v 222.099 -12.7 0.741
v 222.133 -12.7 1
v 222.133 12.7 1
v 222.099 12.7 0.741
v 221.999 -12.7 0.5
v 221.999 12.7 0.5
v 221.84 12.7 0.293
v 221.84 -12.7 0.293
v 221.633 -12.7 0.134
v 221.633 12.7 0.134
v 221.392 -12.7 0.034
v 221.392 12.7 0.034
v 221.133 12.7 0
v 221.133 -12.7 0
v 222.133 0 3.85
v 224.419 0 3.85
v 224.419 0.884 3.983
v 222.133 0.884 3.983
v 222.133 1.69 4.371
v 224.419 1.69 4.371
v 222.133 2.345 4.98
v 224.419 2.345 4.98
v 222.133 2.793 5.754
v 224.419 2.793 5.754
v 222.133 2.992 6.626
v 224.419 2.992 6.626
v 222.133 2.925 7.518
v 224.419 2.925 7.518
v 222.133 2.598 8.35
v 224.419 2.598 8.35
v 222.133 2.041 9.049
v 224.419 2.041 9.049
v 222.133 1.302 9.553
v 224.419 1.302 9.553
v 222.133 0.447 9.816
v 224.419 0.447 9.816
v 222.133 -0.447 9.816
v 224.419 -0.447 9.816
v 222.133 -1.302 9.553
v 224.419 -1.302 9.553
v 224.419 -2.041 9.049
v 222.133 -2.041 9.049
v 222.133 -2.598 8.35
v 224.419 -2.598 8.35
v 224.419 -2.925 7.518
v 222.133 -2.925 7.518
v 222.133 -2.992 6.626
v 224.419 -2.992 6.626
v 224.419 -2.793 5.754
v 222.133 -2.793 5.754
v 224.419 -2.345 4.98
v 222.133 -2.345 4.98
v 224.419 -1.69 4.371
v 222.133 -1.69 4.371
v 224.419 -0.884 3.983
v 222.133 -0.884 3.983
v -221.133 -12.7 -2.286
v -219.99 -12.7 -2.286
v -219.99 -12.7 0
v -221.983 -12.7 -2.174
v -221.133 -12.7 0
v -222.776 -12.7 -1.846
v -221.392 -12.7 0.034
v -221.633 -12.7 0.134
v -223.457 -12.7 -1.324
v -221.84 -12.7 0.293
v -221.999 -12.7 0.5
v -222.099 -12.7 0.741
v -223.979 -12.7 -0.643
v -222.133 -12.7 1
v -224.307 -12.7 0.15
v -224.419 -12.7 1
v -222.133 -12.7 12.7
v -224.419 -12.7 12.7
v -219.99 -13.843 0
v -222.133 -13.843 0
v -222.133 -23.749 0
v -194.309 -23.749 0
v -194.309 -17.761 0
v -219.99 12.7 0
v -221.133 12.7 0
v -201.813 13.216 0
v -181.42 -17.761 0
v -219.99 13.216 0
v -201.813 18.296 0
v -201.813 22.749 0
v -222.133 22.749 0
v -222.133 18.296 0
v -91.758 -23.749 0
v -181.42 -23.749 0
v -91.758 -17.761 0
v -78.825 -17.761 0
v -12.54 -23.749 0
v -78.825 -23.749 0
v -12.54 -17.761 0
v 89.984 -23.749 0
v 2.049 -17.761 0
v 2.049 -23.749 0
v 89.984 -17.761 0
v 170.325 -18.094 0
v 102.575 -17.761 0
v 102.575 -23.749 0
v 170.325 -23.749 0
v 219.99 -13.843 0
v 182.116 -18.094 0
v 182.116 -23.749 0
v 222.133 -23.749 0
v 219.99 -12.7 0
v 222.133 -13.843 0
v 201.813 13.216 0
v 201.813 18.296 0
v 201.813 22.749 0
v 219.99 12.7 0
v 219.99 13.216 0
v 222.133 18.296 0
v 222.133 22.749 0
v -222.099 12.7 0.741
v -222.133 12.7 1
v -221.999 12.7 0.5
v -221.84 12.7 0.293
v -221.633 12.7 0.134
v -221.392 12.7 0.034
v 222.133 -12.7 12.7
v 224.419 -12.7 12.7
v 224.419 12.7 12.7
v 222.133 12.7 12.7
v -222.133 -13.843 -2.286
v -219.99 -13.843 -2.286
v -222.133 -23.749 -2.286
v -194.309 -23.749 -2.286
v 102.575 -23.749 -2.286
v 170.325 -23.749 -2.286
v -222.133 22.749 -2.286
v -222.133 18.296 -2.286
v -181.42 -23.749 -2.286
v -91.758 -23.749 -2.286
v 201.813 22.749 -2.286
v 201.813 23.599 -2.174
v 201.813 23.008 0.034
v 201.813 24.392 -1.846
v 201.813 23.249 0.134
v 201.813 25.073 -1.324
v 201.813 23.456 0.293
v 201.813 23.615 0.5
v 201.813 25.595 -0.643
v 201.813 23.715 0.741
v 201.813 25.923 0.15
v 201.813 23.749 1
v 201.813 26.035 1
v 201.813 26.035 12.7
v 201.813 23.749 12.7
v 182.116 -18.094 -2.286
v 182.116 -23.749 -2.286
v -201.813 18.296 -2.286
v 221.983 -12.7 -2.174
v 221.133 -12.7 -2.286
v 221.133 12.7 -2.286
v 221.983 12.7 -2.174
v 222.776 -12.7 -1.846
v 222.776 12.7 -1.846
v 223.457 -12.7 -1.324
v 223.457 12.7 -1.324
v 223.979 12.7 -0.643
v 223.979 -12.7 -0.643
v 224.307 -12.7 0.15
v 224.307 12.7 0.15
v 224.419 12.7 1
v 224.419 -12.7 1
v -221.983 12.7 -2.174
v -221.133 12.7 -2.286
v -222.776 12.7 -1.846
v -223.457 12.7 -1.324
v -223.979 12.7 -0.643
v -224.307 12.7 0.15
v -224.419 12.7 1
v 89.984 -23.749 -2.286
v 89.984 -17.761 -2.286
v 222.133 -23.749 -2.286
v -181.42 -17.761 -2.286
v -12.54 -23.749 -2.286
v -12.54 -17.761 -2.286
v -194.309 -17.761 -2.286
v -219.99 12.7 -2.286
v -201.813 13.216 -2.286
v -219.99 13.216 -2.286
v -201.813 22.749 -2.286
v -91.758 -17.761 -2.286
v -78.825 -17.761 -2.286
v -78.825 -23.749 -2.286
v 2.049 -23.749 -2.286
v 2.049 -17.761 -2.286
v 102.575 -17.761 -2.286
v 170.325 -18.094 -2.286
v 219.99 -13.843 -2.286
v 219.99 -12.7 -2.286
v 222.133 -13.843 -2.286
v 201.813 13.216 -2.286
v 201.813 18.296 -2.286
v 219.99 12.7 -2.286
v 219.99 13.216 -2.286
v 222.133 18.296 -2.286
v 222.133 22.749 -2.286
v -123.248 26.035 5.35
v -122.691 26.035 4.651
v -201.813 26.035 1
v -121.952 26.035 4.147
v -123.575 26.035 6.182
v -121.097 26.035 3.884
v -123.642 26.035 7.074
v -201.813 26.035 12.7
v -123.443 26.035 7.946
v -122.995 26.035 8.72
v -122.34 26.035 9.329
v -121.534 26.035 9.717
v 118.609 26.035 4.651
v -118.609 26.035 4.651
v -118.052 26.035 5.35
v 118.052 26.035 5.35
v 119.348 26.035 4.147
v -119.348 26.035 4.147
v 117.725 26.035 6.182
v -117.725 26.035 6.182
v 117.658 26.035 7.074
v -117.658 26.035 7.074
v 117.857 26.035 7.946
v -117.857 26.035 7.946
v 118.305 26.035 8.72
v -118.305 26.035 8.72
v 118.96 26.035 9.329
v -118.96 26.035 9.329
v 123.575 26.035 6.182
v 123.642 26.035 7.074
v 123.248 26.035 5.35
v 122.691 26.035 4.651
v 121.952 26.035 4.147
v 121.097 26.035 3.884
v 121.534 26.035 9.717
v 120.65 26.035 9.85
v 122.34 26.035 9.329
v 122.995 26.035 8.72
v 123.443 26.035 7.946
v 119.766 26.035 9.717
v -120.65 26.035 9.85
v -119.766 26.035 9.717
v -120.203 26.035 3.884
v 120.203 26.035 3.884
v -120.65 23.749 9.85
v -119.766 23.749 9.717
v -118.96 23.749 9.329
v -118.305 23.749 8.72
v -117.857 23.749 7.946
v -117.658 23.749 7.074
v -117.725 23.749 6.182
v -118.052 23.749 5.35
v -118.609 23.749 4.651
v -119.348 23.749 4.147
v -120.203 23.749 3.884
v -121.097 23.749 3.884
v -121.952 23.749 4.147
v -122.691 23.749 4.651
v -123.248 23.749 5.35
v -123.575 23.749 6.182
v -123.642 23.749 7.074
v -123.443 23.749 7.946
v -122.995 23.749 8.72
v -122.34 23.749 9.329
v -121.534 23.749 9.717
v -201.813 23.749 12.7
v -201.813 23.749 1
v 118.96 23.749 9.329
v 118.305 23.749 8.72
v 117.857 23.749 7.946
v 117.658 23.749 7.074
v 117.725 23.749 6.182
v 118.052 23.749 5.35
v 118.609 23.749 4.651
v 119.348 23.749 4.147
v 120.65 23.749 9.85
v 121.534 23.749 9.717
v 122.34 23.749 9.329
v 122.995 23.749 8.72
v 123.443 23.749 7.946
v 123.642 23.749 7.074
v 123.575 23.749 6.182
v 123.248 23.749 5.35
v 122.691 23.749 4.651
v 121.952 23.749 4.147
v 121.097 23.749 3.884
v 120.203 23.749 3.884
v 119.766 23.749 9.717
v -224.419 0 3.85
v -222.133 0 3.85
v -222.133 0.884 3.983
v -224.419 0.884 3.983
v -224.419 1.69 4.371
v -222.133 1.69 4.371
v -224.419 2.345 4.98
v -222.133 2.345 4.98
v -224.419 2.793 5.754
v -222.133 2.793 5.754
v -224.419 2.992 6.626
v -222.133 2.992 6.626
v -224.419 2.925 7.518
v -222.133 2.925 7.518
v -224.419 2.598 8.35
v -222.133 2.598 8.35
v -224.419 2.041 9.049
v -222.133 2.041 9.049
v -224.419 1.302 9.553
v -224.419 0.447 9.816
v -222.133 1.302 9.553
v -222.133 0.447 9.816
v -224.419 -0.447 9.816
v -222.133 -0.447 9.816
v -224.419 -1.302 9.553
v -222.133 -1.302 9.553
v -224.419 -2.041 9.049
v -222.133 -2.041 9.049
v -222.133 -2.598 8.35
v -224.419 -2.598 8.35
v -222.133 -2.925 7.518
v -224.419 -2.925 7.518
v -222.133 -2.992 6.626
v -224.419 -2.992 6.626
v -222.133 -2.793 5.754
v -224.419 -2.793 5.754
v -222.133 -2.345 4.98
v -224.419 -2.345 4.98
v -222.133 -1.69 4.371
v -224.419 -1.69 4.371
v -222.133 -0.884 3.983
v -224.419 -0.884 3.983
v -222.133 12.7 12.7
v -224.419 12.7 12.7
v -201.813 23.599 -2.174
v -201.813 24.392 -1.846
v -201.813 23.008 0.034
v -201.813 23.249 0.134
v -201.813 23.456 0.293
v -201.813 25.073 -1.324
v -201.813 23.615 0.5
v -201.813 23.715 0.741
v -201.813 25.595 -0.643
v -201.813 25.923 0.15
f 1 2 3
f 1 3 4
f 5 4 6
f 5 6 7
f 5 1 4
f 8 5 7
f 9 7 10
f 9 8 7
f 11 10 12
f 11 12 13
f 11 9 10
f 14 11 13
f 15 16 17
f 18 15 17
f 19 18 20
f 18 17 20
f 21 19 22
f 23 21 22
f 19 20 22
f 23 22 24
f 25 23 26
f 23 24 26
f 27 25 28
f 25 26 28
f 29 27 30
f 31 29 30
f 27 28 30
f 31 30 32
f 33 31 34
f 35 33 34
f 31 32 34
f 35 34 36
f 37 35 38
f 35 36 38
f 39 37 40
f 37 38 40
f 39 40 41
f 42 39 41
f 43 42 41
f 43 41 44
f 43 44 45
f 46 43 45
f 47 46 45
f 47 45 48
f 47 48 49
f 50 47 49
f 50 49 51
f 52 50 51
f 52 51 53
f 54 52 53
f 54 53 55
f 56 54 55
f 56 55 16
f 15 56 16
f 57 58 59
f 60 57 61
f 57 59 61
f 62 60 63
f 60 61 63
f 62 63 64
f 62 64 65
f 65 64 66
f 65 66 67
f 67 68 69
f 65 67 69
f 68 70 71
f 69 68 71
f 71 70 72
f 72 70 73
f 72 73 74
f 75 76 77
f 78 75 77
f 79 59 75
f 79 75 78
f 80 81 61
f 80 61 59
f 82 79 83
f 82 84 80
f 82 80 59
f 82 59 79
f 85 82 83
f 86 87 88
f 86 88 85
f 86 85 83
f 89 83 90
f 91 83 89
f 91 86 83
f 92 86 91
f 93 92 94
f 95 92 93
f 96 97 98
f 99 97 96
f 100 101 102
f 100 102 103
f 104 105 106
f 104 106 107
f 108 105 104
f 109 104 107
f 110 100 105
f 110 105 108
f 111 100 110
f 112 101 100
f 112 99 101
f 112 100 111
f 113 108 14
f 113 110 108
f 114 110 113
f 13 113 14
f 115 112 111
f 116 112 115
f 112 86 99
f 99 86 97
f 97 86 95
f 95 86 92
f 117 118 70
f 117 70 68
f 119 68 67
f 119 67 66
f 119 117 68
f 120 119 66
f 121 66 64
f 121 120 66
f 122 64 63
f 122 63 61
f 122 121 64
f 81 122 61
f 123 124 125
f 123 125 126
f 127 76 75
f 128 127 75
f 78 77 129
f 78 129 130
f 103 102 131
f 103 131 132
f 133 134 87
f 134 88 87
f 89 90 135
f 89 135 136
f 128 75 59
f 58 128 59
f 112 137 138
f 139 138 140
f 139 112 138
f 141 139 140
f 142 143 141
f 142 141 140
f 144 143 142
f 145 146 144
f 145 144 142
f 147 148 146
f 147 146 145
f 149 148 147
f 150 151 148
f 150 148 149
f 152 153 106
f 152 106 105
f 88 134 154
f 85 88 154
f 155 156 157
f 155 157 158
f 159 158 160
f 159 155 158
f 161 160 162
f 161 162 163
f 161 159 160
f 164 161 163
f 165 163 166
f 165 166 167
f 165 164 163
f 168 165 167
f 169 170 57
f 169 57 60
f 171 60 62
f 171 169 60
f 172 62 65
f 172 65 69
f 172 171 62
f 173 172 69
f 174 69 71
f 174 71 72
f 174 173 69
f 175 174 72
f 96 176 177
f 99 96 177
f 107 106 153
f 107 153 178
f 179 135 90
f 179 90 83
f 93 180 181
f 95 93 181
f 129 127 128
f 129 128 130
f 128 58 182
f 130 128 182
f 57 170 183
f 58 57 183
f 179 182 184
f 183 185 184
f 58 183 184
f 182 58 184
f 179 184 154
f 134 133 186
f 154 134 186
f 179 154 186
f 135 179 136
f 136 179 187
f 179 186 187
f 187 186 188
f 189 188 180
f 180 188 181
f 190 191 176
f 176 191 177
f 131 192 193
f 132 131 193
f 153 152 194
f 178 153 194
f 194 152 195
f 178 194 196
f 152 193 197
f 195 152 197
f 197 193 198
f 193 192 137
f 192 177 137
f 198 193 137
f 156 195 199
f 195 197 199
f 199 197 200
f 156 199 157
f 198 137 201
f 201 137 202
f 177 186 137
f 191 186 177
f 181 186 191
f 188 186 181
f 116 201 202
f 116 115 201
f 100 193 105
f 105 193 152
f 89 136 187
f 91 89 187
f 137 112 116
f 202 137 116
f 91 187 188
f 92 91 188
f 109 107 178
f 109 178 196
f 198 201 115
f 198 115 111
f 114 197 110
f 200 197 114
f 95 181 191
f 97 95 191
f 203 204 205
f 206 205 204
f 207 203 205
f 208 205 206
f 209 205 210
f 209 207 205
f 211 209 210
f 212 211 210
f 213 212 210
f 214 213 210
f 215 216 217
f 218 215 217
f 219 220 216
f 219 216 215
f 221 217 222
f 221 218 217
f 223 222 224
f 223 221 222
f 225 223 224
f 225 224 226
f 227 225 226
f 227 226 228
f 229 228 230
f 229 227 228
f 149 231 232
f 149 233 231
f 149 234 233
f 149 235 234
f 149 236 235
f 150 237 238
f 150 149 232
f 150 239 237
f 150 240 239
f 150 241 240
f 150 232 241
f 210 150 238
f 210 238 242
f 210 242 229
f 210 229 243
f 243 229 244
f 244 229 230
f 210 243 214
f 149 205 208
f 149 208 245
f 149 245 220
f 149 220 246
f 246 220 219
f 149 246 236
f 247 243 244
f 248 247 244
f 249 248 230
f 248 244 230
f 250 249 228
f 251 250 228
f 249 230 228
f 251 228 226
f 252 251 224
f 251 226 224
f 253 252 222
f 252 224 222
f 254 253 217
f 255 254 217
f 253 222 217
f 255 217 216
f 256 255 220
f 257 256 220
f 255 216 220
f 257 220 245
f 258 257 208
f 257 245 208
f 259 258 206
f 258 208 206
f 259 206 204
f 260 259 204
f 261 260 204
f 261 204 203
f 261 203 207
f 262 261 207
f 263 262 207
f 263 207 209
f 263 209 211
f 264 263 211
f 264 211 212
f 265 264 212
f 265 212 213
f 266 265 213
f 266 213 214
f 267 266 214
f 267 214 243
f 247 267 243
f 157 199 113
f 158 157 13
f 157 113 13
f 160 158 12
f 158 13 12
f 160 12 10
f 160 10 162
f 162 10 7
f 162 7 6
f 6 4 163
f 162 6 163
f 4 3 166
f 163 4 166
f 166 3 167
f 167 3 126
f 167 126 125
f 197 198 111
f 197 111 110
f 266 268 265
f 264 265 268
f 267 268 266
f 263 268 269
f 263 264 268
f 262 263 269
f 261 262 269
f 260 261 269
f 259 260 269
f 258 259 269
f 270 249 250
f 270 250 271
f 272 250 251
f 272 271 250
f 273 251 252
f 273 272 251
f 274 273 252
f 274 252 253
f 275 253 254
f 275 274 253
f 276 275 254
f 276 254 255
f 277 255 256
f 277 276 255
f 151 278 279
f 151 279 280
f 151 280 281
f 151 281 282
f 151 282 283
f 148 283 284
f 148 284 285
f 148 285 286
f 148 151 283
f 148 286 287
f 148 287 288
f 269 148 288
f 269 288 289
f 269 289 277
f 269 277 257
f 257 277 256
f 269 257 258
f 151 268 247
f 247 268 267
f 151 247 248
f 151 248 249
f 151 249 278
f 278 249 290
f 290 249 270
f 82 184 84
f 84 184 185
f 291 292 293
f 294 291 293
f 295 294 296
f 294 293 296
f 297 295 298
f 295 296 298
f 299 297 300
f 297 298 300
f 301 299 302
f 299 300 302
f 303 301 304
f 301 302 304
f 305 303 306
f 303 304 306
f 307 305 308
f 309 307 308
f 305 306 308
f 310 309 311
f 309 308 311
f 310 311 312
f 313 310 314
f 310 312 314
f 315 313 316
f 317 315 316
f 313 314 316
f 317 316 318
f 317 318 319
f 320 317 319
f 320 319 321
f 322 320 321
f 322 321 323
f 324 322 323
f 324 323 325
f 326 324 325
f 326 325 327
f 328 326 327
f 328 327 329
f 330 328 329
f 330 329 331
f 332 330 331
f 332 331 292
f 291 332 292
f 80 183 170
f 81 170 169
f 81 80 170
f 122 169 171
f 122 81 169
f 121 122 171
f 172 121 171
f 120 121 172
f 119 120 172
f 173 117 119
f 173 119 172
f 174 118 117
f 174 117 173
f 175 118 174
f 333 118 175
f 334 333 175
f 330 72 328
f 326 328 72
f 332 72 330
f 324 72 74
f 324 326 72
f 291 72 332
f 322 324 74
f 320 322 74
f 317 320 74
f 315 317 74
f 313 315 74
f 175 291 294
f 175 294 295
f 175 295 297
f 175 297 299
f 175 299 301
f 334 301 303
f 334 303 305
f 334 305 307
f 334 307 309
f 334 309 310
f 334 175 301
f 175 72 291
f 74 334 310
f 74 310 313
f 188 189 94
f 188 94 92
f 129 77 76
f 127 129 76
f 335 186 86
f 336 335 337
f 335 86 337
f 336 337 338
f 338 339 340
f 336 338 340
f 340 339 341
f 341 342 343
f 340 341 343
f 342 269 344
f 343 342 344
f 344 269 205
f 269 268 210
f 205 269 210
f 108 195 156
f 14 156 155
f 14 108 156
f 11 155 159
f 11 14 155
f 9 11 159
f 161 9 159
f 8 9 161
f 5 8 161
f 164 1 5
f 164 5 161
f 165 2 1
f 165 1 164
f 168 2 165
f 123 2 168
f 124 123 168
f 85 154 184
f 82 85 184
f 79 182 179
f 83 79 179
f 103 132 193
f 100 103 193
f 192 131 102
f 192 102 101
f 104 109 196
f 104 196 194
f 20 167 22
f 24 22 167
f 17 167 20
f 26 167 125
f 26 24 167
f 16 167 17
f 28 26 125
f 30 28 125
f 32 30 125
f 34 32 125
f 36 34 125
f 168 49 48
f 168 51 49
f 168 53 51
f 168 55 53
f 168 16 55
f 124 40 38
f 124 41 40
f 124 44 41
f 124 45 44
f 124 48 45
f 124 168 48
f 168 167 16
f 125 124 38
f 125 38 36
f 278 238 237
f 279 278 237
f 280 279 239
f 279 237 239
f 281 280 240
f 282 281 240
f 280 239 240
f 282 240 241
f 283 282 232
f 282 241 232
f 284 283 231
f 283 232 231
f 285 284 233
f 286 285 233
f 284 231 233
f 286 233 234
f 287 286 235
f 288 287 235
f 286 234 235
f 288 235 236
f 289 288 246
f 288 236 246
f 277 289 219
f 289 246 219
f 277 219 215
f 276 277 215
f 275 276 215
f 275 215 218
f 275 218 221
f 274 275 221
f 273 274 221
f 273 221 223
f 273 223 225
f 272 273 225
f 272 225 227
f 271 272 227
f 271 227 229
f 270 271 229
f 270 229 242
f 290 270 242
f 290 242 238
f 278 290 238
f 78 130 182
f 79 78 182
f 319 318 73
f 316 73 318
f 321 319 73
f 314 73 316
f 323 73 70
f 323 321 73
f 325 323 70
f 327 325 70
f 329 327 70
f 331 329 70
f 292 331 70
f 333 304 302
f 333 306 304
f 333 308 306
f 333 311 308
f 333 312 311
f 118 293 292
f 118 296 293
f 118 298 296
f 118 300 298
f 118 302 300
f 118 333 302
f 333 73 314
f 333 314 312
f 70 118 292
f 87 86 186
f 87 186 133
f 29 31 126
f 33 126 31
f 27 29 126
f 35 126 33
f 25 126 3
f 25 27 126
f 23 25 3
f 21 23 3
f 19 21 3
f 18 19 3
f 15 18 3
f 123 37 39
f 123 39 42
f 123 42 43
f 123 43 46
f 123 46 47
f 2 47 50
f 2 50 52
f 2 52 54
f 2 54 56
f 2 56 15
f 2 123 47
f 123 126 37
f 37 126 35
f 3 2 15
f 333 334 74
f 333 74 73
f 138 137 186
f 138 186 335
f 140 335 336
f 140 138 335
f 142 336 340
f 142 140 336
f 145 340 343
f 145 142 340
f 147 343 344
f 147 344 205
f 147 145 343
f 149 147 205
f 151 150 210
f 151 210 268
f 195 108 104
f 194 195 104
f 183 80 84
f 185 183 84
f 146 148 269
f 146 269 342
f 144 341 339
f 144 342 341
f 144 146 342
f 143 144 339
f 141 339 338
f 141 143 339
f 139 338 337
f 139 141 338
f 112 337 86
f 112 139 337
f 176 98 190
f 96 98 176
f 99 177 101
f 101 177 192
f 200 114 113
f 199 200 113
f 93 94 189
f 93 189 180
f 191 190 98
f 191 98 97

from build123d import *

# Parameters (mm, degrees)
SKETCH1_W                     = 444.26599996
SKETCH1_H                     = 47.498
BASE_FLANGE1_DEPTH            = 2.286
EDGE_FLANGE1_STRIP_W          = 11.144
EDGE_FLANGE1_STRIP_H          = 2.286
EDGE_FLANGE1_STRIP_CUT_DEPTH  = 25.4
EDGE_FLANGE1_RELIEF_W         = 12.287
EDGE_FLANGE1_RELIEF_H         = 1.143
EDGE_FLANGE1_RELIEF_CUT_DEPTH = 2.286
EDGE_FLANGE1_DEPTH            = 25.4
EDGE_FLANGE2_STRIP_W          = 11.144
EDGE_FLANGE2_STRIP_H          = 2.286
EDGE_FLANGE2_STRIP_CUT_DEPTH  = 25.4
EDGE_FLANGE2_RELIEF_W         = 12.287
EDGE_FLANGE2_RELIEF_H         = 1.143
EDGE_FLANGE2_RELIEF_CUT_DEPTH = 2.286
EDGE_FLANGE2_DEPTH            = 25.4
EDGE_FLANGE6_STRIP_W          = 11.144
EDGE_FLANGE6_STRIP_H          = 2.286
EDGE_FLANGE6_STRIP_CUT_DEPTH  = 444.26599996
EDGE_FLANGE6_DEPTH            = 444.26599996
SKETCH52_R                    = 3
CUT_EXTRUDE2_DEPTH            = 231.225159807
SKETCH53_R                    = 3
CUT_EXTRUDE3_DEPTH            = 450.771788169
SKETCH54_W                    = 20.32
SKETCH54_H                    = 3.286
CUT_EXTRUDE4_DEPTH            = 227.280796306
CUT_EXTRUDE6_DEPTH            = 227.280796306
CUT_EXTRUDE6_DEPTH_BACK       = 227.280796306
SKETCH57_W                    = 12.932384232
SKETCH57_H                    = 5.987852531
SKETCH57_W_2                  = 12.889095721
SKETCH57_H_2                  = 5.98785253
SKETCH57_W_3                  = 14.589217144
SKETCH57_H_3                  = 5.987852532
SKETCH57_W_4                  = 12.590694247
SKETCH57_H_4                  = 5.987852533
SKETCH57_W_5                  = 11.791285089
SKETCH57_H_5                  = 5.654723841


# Sheet-metal steps are written as plain solids
with BuildPart() as part:
    # Sketch1 → Base-Flange1 (new body)
    with BuildSketch(Plane.XY):
        Rectangle(SKETCH1_W, SKETCH1_H)
    extrude(amount=-BASE_FLANGE1_DEPTH)

    # Edge-Flange1 strip (across the edge) → Edge-Flange1 strip cut (cut)
    with BuildSketch(Plane(origin=(222.13299998, -12.7, 0), x_dir=(-1, 0, 0), z_dir=(0, 1, 0))):
        with Locations((-4.572, -1.143)):
            Rectangle(EDGE_FLANGE1_STRIP_W, EDGE_FLANGE1_STRIP_H)
    extrude(amount=EDGE_FLANGE1_STRIP_CUT_DEPTH, mode=Mode.SUBTRACT)

    # Edge-Flange1 relief (on the sheet) → Edge-Flange1 relief cut (cut)
    with BuildSketch(Plane(origin=(221.13299998, -12.7, 0), x_dir=(-1, 0, 0), z_dir=(0, 0, 1))):
        with Locations((-5.0005, 0.5715)):
            Rectangle(EDGE_FLANGE1_RELIEF_W, EDGE_FLANGE1_RELIEF_H)
        with Locations((-5.0005, -25.9715)):
            Rectangle(EDGE_FLANGE1_RELIEF_W, EDGE_FLANGE1_RELIEF_H)
    extrude(amount=-EDGE_FLANGE1_RELIEF_CUT_DEPTH, mode=Mode.SUBTRACT)

    # Edge-Flange1 section (across the edge) → Edge-Flange1 (add)
    with BuildSketch(Plane(origin=(222.13299998, -12.7, 0), x_dir=(-1, 0, 0), z_dir=(0, 1, 0))):
        with BuildLine():
            Line((-2.286, 1), (-2.286, 12.7))
            Line((-2.286, 12.7), (0, 12.7))
            Line((0, 12.7), (0, 1))
            ThreePointArc((0, 1), (0.292893219, 0.292893219), (1, 0))
            Line((1, 0), (1, -2.286))
            ThreePointArc((1, -2.286), (-1.323552883, -1.323552883), (-2.286, 1))
        make_face()
    extrude(amount=EDGE_FLANGE1_DEPTH)

    # Edge-Flange2 strip (across the edge) → Edge-Flange2 strip cut (cut)
    with BuildSketch(Plane(origin=(-222.13299998, 12.7, 0), x_dir=(1, 0, 0), z_dir=(0, -1, 0))):
        with Locations((-4.572, -1.143)):
            Rectangle(EDGE_FLANGE2_STRIP_W, EDGE_FLANGE2_STRIP_H)
    extrude(amount=EDGE_FLANGE2_STRIP_CUT_DEPTH, mode=Mode.SUBTRACT)

    # Edge-Flange2 relief (on the sheet) → Edge-Flange2 relief cut (cut)
    with BuildSketch(Plane(origin=(-221.13299998, 12.7, 0), x_dir=(1, 0, 0), z_dir=(0, 0, 1))):
        with Locations((-5.0005, 0.5715)):
            Rectangle(EDGE_FLANGE2_RELIEF_W, EDGE_FLANGE2_RELIEF_H)
        with Locations((-5.0005, -25.9715)):
            Rectangle(EDGE_FLANGE2_RELIEF_W, EDGE_FLANGE2_RELIEF_H)
    extrude(amount=-EDGE_FLANGE2_RELIEF_CUT_DEPTH, mode=Mode.SUBTRACT)

    # Edge-Flange2 section (across the edge) → Edge-Flange2 (add)
    with BuildSketch(Plane(origin=(-222.13299998, 12.7, 0), x_dir=(1, 0, 0), z_dir=(0, -1, 0))):
        with BuildLine():
            Line((-2.286, 1), (-2.286, 12.7))
            Line((-2.286, 12.7), (0, 12.7))
            Line((0, 12.7), (0, 1))
            ThreePointArc((0, 1), (0.292893219, 0.292893219), (1, 0))
            Line((1, 0), (1, -2.286))
            ThreePointArc((1, -2.286), (-1.323552883, -1.323552883), (-2.286, 1))
        make_face()
    extrude(amount=EDGE_FLANGE2_DEPTH)

    # Edge-Flange6 strip (across the edge) → Edge-Flange6 strip cut (cut)
    with BuildSketch(Plane(origin=(222.13299998, 23.749, 0), x_dir=(0, -1, 0), z_dir=(-1, 0, 0))):
        with Locations((-4.572, -1.143)):
            Rectangle(EDGE_FLANGE6_STRIP_W, EDGE_FLANGE6_STRIP_H)
    extrude(amount=EDGE_FLANGE6_STRIP_CUT_DEPTH, mode=Mode.SUBTRACT)

    # Edge-Flange6 section (across the edge) → Edge-Flange6 (add)
    with BuildSketch(Plane(origin=(222.13299998, 23.749, 0), x_dir=(0, -1, 0), z_dir=(-1, 0, 0))):
        with BuildLine():
            Line((-2.286, 1), (-2.286, 12.7))
            Line((-2.286, 12.7), (0, 12.7))
            Line((0, 12.7), (0, 1))
            ThreePointArc((0, 1), (0.292893219, 0.292893219), (1, 0))
            Line((1, 0), (1, -2.286))
            ThreePointArc((1, -2.286), (-1.323552883, -1.323552883), (-2.286, 1))
        make_face()
    extrude(amount=EDGE_FLANGE6_DEPTH)

    # Sketch52 → Cut-Extrude2 (cut, through all)
    with BuildSketch(Plane(origin=(0, 26.035, 0), x_dir=(1, 0, 0), z_dir=(0, 1, 0))):
        with Locations(Location((120.65, -6.85, 0), (0, 0, 270))):
            Circle(SKETCH52_R)
        with Locations(Location((-120.65, -6.85, 0), (0, 0, 270))):
            Circle(SKETCH52_R)
    extrude(amount=-CUT_EXTRUDE2_DEPTH, mode=Mode.SUBTRACT)

    # Sketch53 → Cut-Extrude3 (cut, through all)
    with BuildSketch(Plane(origin=(224.41899998, 0, 0), x_dir=(0, 0, -1), z_dir=(1, 0, 0))):
        with Locations((-6.85, 0)):
            Circle(SKETCH53_R)
    extrude(amount=-CUT_EXTRUDE3_DEPTH, mode=Mode.SUBTRACT)

    # Sketch54 → Cut-Extrude4 (cut, symmetric)
    with BuildSketch(Plane.XY):
        Polygon((222.13299998, 13.843), (222.13299998, 18.296), (201.81299998, 18.296), (201.81299998, 13.216), (219.98999998, 13.216), (219.98999998, 13.843), align=None)
        with Locations((211.97299998, 24.392)):
            Rectangle(SKETCH54_W, SKETCH54_H)
    cut_extrude4 = extrude(amount=CUT_EXTRUDE4_DEPTH, both=True, mode=Mode.SUBTRACT)

    # Mirror1: Cut-Extrude4 across plane
    add(cut_extrude4.mirror(Plane(origin=(0, 0, 0), x_dir=(0, 0, 1), z_dir=(1, 0, 0))), mode=Mode.SUBTRACT)

    # Sketch57 → Cut-Extrude6 (cut, two sides: drawn at the far end of the back side and taken through both)
    with BuildSketch(Plane.XY.offset(-CUT_EXTRUDE6_DEPTH_BACK)):
        with Locations((-85.29165905, -20.755073735)):
            Rectangle(SKETCH57_W, SKETCH57_H)
        with Locations((-187.864563379, -20.755073735)):
            Rectangle(SKETCH57_W_2, SKETCH57_H_2)
        with Locations((-5.245477464, -20.755073734)):
            Rectangle(SKETCH57_W_3, SKETCH57_H_3)
        with Locations((96.279485673, -20.755073734)):
            Rectangle(SKETCH57_W_4, SKETCH57_H_4)
        with Locations((176.220401529, -20.921638079)):
            Rectangle(SKETCH57_W_5, SKETCH57_H_5)
    extrude(amount=CUT_EXTRUDE6_DEPTH + CUT_EXTRUDE6_DEPTH_BACK, mode=Mode.SUBTRACT)


solid = part.part
